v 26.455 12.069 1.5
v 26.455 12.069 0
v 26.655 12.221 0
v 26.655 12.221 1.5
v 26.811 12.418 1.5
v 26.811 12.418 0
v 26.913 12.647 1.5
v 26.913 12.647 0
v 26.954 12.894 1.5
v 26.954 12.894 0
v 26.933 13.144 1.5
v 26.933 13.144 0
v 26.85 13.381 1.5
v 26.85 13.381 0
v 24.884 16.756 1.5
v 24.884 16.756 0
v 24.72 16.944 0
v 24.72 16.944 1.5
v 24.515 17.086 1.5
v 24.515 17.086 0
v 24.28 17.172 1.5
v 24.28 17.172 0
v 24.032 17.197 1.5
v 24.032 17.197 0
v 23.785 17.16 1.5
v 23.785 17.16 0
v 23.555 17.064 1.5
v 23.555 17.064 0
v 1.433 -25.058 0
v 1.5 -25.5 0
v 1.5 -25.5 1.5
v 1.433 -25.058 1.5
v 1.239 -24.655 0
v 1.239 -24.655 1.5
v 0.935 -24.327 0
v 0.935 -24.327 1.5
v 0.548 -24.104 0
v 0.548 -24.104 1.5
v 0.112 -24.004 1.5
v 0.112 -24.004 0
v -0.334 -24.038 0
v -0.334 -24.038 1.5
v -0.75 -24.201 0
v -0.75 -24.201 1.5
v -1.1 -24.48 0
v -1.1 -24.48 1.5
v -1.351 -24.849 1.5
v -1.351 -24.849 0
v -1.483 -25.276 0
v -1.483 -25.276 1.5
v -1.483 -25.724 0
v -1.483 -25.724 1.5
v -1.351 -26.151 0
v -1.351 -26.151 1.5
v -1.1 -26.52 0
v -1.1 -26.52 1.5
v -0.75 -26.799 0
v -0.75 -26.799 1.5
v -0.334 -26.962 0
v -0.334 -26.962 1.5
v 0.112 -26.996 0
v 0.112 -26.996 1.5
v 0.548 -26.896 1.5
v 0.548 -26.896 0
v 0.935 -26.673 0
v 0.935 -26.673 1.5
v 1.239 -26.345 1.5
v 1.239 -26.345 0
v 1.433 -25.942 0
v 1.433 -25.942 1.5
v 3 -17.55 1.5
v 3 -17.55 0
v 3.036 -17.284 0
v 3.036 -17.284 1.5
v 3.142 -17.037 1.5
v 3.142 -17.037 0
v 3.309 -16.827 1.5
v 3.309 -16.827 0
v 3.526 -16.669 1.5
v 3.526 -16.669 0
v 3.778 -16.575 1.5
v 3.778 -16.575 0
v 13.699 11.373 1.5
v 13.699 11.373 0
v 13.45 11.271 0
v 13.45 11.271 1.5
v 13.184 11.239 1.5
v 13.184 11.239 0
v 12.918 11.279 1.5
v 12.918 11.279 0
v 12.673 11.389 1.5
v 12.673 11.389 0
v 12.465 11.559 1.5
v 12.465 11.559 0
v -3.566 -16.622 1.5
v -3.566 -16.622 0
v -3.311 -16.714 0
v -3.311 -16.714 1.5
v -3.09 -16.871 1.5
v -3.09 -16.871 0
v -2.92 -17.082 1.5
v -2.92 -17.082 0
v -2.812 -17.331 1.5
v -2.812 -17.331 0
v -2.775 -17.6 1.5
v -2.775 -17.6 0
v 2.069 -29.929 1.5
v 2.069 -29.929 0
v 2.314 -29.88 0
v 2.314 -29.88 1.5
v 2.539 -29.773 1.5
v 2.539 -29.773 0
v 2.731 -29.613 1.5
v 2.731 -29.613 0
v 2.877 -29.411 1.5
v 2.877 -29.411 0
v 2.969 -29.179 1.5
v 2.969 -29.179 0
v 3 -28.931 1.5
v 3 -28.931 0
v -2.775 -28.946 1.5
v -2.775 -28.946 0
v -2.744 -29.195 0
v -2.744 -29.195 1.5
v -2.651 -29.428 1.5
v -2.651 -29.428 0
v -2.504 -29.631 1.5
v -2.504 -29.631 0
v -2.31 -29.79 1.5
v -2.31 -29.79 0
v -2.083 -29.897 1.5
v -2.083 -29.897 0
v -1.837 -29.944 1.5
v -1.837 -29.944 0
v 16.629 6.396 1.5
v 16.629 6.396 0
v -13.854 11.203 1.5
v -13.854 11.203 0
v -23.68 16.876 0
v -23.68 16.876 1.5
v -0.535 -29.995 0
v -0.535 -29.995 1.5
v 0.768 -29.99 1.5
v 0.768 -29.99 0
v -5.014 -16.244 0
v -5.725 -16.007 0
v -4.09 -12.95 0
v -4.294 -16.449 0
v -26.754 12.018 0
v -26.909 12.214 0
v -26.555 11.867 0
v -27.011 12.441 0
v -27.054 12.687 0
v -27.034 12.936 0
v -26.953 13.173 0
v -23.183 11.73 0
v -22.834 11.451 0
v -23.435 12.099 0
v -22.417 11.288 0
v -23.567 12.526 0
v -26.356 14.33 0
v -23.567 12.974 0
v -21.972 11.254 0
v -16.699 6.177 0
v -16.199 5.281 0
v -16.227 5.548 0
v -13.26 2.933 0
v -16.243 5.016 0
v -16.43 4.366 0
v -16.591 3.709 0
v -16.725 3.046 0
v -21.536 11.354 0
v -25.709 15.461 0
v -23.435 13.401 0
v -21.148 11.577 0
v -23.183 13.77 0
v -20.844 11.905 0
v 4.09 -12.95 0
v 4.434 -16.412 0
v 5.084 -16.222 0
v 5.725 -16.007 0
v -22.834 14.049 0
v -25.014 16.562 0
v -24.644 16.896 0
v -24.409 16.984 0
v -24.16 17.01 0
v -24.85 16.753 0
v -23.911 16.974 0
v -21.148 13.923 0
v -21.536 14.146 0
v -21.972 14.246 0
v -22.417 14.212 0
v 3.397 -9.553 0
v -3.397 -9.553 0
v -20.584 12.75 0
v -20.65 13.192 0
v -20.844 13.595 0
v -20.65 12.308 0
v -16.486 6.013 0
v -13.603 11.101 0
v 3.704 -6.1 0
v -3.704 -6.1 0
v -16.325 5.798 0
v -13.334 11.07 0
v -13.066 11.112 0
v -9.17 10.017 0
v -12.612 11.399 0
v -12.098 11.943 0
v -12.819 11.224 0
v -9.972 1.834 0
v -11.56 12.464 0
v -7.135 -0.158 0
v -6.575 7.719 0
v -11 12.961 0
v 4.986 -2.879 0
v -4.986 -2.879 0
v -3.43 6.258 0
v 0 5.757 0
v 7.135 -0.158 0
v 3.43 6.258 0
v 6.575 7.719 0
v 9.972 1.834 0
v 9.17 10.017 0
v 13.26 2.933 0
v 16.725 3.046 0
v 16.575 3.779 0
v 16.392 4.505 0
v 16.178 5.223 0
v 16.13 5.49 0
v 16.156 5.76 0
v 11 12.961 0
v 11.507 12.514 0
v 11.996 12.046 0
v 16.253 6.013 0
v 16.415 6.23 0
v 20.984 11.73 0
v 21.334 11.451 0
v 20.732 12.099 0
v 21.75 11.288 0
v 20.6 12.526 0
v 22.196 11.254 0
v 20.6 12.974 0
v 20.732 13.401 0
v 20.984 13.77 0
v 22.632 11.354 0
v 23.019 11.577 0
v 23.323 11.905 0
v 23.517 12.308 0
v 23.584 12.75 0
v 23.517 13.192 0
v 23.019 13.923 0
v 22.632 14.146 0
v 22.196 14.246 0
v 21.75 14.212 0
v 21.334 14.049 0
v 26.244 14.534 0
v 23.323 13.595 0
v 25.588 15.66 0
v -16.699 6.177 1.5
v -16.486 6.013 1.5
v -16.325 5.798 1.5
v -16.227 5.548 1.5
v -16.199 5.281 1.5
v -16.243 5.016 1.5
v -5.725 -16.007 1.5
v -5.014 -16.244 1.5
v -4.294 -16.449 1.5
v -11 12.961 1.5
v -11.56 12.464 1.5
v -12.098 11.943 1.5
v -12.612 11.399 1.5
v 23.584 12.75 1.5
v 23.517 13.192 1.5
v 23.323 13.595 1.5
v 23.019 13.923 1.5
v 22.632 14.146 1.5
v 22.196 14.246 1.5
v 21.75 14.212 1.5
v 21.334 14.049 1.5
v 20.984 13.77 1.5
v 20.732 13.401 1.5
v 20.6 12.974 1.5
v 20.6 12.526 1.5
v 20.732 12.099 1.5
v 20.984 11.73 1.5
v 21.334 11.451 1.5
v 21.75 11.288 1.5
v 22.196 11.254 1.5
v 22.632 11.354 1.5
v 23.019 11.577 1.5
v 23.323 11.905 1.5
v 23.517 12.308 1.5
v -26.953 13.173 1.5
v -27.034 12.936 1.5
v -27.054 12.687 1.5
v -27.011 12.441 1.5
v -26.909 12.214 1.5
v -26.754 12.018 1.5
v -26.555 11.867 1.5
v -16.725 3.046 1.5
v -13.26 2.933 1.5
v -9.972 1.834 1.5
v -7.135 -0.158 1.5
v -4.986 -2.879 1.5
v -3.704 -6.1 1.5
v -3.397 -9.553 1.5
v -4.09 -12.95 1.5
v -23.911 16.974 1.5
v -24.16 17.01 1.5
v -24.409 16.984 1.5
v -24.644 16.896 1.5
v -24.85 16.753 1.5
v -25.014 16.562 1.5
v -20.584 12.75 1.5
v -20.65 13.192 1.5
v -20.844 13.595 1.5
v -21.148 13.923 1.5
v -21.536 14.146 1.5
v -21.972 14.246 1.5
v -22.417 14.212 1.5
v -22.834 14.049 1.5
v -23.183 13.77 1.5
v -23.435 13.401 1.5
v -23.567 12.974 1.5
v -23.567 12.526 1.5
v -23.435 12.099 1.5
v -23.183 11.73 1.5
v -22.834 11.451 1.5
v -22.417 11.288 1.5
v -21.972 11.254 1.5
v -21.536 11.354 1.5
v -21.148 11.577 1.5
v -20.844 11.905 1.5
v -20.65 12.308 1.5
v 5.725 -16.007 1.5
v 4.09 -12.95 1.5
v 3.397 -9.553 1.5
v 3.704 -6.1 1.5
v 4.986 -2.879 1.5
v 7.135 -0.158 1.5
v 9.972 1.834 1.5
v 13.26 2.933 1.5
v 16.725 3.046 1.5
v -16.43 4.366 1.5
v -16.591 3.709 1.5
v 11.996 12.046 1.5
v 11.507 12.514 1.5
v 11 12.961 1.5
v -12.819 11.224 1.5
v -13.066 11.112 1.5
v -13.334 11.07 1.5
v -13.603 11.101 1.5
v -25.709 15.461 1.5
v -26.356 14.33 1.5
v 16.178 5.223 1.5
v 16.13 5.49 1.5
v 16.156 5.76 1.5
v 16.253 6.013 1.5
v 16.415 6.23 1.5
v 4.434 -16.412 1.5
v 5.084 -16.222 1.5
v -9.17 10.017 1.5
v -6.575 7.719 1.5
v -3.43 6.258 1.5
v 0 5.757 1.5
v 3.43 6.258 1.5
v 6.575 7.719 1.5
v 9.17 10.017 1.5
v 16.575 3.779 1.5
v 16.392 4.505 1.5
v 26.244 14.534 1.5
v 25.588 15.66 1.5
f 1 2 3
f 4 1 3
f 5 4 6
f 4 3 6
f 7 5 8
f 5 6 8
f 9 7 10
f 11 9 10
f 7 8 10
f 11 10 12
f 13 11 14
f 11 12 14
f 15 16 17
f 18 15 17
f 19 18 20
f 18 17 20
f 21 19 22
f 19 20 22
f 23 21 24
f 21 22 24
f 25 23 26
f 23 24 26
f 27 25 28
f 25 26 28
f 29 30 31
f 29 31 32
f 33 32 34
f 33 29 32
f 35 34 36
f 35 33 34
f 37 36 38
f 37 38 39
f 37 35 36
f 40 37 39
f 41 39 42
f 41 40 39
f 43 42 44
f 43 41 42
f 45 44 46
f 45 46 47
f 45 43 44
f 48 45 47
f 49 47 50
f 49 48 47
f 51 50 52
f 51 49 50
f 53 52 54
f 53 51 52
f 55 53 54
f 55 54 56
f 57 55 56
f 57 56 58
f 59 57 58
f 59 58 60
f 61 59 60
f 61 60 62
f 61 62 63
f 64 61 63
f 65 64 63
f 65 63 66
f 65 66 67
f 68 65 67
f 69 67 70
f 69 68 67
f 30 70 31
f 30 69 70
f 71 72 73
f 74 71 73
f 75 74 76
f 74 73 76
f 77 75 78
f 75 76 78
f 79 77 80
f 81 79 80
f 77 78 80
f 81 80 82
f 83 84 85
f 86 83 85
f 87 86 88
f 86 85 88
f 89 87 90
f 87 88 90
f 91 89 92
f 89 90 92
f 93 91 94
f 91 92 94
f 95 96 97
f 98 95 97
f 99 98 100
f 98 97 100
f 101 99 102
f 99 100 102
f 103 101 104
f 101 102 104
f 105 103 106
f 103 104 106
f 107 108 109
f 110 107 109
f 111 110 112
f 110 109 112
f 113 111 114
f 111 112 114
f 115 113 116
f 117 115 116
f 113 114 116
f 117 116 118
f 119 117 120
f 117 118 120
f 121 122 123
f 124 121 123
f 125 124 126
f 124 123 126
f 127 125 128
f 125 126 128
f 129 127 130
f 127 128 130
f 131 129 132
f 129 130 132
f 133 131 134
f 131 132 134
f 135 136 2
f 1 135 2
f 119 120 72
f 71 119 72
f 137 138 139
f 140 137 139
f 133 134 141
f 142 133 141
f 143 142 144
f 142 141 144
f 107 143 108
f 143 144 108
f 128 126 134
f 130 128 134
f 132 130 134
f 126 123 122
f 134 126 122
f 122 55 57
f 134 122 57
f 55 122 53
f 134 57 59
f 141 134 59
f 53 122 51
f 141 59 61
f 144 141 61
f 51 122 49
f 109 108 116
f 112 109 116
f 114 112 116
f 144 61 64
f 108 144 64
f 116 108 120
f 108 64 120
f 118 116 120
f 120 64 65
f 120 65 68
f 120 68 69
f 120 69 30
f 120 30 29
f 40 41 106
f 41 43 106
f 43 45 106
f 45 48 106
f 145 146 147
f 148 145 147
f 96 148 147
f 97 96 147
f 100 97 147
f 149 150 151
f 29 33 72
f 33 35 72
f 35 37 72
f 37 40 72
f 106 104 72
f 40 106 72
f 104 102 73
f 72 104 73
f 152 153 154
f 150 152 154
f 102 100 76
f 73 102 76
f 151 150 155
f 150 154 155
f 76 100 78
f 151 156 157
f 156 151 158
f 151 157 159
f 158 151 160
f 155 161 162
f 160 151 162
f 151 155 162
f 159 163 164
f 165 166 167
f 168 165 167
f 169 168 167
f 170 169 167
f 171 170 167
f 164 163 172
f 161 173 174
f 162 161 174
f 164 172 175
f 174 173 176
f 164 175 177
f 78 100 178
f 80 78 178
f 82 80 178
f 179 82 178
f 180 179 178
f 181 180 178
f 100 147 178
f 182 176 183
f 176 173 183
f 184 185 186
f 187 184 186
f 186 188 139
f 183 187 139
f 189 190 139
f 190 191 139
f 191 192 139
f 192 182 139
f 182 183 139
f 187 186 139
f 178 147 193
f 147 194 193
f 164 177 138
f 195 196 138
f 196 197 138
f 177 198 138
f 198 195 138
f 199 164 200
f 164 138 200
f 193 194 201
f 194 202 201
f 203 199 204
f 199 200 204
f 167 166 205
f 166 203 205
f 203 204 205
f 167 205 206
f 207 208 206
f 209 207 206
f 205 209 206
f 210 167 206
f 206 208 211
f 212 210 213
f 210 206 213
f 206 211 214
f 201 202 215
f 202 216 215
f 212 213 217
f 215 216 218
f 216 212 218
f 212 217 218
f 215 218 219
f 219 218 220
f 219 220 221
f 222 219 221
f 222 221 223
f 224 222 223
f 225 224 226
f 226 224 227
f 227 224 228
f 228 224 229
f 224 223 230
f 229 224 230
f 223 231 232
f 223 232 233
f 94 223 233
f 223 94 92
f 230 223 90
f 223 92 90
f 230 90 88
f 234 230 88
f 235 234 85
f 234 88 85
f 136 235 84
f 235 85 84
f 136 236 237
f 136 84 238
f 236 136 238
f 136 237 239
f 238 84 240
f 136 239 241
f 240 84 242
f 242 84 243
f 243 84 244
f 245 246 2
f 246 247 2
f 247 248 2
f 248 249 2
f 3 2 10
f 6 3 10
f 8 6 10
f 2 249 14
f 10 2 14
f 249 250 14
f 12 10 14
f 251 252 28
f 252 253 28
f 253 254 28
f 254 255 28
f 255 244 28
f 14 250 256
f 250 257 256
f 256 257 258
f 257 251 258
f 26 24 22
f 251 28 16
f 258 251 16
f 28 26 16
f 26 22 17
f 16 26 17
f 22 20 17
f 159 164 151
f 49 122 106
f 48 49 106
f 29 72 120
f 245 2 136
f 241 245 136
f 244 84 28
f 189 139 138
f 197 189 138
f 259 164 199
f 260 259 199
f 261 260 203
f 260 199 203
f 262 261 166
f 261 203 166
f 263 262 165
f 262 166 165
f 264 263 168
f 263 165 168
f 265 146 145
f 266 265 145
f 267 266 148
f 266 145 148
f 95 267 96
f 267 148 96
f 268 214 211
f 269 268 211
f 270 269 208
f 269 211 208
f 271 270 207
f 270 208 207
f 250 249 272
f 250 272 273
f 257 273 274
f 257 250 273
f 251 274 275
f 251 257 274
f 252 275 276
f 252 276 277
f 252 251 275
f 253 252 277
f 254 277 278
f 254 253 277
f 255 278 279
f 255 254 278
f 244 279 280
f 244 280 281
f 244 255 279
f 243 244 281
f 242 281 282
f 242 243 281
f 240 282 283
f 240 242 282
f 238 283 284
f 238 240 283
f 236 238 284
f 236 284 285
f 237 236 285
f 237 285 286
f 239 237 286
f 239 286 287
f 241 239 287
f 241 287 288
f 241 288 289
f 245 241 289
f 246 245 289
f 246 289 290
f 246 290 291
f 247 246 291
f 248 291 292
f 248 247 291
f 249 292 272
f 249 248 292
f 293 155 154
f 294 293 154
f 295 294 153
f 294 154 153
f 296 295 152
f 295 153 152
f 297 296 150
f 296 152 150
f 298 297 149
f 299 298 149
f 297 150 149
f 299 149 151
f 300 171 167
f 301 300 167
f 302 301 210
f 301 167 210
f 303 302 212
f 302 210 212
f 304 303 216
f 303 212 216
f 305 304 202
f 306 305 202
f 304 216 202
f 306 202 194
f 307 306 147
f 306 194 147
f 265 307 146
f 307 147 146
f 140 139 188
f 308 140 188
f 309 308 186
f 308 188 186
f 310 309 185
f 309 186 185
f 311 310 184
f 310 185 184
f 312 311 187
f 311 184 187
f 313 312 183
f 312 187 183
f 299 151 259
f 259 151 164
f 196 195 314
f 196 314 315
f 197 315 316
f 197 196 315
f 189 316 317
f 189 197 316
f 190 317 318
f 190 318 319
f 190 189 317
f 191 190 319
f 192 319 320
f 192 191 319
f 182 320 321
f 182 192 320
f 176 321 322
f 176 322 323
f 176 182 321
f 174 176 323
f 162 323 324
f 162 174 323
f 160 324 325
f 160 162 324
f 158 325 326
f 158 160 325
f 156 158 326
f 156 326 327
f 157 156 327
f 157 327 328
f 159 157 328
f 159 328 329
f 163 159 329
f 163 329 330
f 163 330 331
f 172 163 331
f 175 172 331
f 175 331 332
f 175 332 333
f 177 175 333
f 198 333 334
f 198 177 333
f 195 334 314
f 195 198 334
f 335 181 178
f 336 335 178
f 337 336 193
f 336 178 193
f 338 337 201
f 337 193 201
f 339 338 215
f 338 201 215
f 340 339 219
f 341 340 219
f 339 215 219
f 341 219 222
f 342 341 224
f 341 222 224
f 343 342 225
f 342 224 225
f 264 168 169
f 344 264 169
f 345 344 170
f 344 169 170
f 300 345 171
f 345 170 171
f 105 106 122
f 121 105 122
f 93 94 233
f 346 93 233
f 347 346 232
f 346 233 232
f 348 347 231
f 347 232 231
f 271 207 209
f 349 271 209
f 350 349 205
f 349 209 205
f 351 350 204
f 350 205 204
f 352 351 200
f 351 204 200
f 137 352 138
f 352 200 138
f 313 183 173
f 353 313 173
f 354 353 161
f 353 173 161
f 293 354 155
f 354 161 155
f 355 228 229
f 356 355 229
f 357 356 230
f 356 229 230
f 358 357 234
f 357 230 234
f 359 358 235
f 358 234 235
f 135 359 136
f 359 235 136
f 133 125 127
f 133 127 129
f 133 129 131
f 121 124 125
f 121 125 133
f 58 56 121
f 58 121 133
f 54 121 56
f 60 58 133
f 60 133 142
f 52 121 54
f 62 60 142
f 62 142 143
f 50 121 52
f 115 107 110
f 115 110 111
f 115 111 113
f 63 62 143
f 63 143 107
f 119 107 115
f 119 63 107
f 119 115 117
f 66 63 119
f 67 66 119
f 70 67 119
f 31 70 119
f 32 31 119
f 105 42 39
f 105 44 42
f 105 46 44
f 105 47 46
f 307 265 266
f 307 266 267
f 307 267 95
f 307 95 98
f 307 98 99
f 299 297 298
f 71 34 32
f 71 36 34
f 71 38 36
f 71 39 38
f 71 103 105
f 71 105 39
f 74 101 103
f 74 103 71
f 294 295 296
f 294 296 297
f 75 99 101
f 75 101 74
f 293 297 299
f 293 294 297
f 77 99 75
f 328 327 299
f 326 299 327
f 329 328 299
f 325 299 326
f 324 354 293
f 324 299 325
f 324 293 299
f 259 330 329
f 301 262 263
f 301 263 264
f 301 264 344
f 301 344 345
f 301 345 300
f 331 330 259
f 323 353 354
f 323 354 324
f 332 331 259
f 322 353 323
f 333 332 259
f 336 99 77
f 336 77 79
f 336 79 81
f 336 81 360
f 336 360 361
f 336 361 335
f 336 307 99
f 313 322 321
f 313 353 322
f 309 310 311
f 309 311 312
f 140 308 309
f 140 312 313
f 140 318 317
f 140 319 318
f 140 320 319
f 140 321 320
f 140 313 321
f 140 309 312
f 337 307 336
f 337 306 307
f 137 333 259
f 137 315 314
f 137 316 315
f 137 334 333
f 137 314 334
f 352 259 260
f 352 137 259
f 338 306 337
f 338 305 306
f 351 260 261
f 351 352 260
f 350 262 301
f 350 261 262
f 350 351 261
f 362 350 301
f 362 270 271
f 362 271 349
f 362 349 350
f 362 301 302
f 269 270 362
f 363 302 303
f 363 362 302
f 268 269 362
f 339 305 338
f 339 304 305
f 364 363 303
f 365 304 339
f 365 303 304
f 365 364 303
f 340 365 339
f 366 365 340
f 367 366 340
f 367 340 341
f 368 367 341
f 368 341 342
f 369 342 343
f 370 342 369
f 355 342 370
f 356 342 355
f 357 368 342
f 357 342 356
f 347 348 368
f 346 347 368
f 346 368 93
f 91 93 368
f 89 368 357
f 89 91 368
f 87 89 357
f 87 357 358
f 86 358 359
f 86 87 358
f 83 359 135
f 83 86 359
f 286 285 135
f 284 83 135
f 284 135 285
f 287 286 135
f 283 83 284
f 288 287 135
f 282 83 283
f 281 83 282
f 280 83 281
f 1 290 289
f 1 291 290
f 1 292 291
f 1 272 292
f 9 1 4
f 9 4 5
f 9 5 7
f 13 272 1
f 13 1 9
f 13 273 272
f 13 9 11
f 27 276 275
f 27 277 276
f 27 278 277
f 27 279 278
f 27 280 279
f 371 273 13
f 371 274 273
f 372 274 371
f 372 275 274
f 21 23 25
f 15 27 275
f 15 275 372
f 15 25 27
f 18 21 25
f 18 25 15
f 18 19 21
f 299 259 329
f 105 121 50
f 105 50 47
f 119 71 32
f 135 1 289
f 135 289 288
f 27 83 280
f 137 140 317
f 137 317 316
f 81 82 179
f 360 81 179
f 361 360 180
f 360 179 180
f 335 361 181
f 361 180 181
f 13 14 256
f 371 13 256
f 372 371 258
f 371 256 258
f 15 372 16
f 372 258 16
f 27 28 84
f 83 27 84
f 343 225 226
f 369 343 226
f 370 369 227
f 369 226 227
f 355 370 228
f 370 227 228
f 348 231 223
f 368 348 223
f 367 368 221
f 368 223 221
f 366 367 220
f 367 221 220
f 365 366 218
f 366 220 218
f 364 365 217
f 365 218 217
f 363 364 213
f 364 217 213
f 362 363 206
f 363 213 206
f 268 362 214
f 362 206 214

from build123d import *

# Parameters (mm, degrees)
F0_R     = 1.5
F1_DEPTH = 1.5


with BuildPart() as f1:
    # F0 (on Top) → F1 (new body)
    with BuildSketch(Plane.XY):
        with BuildLine():
            ThreePointArc((-23.679947, 16.87634), (-24.409064, 16.983713), (-25.013738, 16.562394))
            ThreePointArc((-25.013738, 16.562394), (-26.038785, 14.899049), (-26.953386, 13.172509))
            ThreePointArc((-26.953386, 13.172509), (-27.01136, 12.441433), (-26.55494, 11.8674))
            Line((-26.55494, 11.8674), (-16.698684, 6.176888))
            ThreePointArc((-16.698684, 6.176888), (-16.267754, 5.676061), (-16.243202, 5.015815))
            ThreePointArc((-16.243202, 5.015815), (-16.513498, 4.037868), (-16.724972, 3.045539))
            ThreePointArc((-16.724972, 3.045539), (-4.985979, -2.878656), (-5.724972, -16.00702))
            ThreePointArc((-5.724972, -16.00702), (-4.655459, -16.350129), (-3.565623, -16.621863))
            ThreePointArc((-3.565623, -16.621863), (-2.997631, -16.971027), (-2.775366, -17.59962))
            Line((-2.775366, -17.59962), (-2.775366, -28.945605))
            ThreePointArc((-2.775366, -28.945605), (-2.503795, -29.630726), (-1.836585, -29.94373))
            ThreePointArc((-1.836585, -29.94373), (0.116437, -29.999774), (2.068966, -29.928571))
            ThreePointArc((2.068966, -29.928571), (2.731083, -29.613241), (3, -28.930952))
            Line((3, -28.930952), (3, -17.549929))
            ThreePointArc((3, -17.549929), (3.218264, -16.926319), (3.777778, -16.574933))
            ThreePointArc((3.777778, -16.574933), (4.759852, -16.320043), (5.724972, -16.00702))
            ThreePointArc((5.724972, -16.00702), (4.985979, -2.878656), (16.724972, 3.045539))
            ThreePointArc((16.724972, 3.045539), (16.487356, 4.143319), (16.177767, 5.223011))
            ThreePointArc((16.177767, 5.223011), (16.196156, 5.889489), (16.629401, 6.396273))
            Line((16.629401, 6.396273), (26.455312, 12.069266))
            ThreePointArc((26.455312, 12.069266), (26.912859, 12.647013), (26.850323, 13.381336))
            ThreePointArc((26.850323, 13.381336), (25.922348, 15.100725), (24.88442, 16.756062))
            ThreePointArc((24.88442, 16.756062), (24.280277, 17.171808), (23.55494, 17.063552))
            Line((23.55494, 17.063552), (13.698684, 11.373041))
            ThreePointArc((13.698684, 11.373041), (13.04949, 11.250258), (12.465424, 11.559118))
            ThreePointArc((12.465424, 11.559118), (11.753646, 12.282175), (11, 12.961481))
            ThreePointArc((11, 12.961481), (0, 5.757313), (-11, 12.961481))
            ThreePointArc((-11, 12.961481), (-11.831897, 12.20681), (-12.612144, 11.398852))
            ThreePointArc((-12.612144, 11.398852), (-13.198525, 11.081538), (-13.854035, 11.203347))
            Line((-13.854035, 11.203347), (-23.679947, 16.87634))
        make_face()
        with Locations((0, -25.5)):
            Circle(F0_R, mode=Mode.SUBTRACT)
        with Locations((-22.083648, 12.75)):
            Circle(F0_R, mode=Mode.SUBTRACT)
        with Locations((22.083648, 12.75)):
            Circle(F0_R, mode=Mode.SUBTRACT)
    extrude(amount=F1_DEPTH)


solid = f1.part
